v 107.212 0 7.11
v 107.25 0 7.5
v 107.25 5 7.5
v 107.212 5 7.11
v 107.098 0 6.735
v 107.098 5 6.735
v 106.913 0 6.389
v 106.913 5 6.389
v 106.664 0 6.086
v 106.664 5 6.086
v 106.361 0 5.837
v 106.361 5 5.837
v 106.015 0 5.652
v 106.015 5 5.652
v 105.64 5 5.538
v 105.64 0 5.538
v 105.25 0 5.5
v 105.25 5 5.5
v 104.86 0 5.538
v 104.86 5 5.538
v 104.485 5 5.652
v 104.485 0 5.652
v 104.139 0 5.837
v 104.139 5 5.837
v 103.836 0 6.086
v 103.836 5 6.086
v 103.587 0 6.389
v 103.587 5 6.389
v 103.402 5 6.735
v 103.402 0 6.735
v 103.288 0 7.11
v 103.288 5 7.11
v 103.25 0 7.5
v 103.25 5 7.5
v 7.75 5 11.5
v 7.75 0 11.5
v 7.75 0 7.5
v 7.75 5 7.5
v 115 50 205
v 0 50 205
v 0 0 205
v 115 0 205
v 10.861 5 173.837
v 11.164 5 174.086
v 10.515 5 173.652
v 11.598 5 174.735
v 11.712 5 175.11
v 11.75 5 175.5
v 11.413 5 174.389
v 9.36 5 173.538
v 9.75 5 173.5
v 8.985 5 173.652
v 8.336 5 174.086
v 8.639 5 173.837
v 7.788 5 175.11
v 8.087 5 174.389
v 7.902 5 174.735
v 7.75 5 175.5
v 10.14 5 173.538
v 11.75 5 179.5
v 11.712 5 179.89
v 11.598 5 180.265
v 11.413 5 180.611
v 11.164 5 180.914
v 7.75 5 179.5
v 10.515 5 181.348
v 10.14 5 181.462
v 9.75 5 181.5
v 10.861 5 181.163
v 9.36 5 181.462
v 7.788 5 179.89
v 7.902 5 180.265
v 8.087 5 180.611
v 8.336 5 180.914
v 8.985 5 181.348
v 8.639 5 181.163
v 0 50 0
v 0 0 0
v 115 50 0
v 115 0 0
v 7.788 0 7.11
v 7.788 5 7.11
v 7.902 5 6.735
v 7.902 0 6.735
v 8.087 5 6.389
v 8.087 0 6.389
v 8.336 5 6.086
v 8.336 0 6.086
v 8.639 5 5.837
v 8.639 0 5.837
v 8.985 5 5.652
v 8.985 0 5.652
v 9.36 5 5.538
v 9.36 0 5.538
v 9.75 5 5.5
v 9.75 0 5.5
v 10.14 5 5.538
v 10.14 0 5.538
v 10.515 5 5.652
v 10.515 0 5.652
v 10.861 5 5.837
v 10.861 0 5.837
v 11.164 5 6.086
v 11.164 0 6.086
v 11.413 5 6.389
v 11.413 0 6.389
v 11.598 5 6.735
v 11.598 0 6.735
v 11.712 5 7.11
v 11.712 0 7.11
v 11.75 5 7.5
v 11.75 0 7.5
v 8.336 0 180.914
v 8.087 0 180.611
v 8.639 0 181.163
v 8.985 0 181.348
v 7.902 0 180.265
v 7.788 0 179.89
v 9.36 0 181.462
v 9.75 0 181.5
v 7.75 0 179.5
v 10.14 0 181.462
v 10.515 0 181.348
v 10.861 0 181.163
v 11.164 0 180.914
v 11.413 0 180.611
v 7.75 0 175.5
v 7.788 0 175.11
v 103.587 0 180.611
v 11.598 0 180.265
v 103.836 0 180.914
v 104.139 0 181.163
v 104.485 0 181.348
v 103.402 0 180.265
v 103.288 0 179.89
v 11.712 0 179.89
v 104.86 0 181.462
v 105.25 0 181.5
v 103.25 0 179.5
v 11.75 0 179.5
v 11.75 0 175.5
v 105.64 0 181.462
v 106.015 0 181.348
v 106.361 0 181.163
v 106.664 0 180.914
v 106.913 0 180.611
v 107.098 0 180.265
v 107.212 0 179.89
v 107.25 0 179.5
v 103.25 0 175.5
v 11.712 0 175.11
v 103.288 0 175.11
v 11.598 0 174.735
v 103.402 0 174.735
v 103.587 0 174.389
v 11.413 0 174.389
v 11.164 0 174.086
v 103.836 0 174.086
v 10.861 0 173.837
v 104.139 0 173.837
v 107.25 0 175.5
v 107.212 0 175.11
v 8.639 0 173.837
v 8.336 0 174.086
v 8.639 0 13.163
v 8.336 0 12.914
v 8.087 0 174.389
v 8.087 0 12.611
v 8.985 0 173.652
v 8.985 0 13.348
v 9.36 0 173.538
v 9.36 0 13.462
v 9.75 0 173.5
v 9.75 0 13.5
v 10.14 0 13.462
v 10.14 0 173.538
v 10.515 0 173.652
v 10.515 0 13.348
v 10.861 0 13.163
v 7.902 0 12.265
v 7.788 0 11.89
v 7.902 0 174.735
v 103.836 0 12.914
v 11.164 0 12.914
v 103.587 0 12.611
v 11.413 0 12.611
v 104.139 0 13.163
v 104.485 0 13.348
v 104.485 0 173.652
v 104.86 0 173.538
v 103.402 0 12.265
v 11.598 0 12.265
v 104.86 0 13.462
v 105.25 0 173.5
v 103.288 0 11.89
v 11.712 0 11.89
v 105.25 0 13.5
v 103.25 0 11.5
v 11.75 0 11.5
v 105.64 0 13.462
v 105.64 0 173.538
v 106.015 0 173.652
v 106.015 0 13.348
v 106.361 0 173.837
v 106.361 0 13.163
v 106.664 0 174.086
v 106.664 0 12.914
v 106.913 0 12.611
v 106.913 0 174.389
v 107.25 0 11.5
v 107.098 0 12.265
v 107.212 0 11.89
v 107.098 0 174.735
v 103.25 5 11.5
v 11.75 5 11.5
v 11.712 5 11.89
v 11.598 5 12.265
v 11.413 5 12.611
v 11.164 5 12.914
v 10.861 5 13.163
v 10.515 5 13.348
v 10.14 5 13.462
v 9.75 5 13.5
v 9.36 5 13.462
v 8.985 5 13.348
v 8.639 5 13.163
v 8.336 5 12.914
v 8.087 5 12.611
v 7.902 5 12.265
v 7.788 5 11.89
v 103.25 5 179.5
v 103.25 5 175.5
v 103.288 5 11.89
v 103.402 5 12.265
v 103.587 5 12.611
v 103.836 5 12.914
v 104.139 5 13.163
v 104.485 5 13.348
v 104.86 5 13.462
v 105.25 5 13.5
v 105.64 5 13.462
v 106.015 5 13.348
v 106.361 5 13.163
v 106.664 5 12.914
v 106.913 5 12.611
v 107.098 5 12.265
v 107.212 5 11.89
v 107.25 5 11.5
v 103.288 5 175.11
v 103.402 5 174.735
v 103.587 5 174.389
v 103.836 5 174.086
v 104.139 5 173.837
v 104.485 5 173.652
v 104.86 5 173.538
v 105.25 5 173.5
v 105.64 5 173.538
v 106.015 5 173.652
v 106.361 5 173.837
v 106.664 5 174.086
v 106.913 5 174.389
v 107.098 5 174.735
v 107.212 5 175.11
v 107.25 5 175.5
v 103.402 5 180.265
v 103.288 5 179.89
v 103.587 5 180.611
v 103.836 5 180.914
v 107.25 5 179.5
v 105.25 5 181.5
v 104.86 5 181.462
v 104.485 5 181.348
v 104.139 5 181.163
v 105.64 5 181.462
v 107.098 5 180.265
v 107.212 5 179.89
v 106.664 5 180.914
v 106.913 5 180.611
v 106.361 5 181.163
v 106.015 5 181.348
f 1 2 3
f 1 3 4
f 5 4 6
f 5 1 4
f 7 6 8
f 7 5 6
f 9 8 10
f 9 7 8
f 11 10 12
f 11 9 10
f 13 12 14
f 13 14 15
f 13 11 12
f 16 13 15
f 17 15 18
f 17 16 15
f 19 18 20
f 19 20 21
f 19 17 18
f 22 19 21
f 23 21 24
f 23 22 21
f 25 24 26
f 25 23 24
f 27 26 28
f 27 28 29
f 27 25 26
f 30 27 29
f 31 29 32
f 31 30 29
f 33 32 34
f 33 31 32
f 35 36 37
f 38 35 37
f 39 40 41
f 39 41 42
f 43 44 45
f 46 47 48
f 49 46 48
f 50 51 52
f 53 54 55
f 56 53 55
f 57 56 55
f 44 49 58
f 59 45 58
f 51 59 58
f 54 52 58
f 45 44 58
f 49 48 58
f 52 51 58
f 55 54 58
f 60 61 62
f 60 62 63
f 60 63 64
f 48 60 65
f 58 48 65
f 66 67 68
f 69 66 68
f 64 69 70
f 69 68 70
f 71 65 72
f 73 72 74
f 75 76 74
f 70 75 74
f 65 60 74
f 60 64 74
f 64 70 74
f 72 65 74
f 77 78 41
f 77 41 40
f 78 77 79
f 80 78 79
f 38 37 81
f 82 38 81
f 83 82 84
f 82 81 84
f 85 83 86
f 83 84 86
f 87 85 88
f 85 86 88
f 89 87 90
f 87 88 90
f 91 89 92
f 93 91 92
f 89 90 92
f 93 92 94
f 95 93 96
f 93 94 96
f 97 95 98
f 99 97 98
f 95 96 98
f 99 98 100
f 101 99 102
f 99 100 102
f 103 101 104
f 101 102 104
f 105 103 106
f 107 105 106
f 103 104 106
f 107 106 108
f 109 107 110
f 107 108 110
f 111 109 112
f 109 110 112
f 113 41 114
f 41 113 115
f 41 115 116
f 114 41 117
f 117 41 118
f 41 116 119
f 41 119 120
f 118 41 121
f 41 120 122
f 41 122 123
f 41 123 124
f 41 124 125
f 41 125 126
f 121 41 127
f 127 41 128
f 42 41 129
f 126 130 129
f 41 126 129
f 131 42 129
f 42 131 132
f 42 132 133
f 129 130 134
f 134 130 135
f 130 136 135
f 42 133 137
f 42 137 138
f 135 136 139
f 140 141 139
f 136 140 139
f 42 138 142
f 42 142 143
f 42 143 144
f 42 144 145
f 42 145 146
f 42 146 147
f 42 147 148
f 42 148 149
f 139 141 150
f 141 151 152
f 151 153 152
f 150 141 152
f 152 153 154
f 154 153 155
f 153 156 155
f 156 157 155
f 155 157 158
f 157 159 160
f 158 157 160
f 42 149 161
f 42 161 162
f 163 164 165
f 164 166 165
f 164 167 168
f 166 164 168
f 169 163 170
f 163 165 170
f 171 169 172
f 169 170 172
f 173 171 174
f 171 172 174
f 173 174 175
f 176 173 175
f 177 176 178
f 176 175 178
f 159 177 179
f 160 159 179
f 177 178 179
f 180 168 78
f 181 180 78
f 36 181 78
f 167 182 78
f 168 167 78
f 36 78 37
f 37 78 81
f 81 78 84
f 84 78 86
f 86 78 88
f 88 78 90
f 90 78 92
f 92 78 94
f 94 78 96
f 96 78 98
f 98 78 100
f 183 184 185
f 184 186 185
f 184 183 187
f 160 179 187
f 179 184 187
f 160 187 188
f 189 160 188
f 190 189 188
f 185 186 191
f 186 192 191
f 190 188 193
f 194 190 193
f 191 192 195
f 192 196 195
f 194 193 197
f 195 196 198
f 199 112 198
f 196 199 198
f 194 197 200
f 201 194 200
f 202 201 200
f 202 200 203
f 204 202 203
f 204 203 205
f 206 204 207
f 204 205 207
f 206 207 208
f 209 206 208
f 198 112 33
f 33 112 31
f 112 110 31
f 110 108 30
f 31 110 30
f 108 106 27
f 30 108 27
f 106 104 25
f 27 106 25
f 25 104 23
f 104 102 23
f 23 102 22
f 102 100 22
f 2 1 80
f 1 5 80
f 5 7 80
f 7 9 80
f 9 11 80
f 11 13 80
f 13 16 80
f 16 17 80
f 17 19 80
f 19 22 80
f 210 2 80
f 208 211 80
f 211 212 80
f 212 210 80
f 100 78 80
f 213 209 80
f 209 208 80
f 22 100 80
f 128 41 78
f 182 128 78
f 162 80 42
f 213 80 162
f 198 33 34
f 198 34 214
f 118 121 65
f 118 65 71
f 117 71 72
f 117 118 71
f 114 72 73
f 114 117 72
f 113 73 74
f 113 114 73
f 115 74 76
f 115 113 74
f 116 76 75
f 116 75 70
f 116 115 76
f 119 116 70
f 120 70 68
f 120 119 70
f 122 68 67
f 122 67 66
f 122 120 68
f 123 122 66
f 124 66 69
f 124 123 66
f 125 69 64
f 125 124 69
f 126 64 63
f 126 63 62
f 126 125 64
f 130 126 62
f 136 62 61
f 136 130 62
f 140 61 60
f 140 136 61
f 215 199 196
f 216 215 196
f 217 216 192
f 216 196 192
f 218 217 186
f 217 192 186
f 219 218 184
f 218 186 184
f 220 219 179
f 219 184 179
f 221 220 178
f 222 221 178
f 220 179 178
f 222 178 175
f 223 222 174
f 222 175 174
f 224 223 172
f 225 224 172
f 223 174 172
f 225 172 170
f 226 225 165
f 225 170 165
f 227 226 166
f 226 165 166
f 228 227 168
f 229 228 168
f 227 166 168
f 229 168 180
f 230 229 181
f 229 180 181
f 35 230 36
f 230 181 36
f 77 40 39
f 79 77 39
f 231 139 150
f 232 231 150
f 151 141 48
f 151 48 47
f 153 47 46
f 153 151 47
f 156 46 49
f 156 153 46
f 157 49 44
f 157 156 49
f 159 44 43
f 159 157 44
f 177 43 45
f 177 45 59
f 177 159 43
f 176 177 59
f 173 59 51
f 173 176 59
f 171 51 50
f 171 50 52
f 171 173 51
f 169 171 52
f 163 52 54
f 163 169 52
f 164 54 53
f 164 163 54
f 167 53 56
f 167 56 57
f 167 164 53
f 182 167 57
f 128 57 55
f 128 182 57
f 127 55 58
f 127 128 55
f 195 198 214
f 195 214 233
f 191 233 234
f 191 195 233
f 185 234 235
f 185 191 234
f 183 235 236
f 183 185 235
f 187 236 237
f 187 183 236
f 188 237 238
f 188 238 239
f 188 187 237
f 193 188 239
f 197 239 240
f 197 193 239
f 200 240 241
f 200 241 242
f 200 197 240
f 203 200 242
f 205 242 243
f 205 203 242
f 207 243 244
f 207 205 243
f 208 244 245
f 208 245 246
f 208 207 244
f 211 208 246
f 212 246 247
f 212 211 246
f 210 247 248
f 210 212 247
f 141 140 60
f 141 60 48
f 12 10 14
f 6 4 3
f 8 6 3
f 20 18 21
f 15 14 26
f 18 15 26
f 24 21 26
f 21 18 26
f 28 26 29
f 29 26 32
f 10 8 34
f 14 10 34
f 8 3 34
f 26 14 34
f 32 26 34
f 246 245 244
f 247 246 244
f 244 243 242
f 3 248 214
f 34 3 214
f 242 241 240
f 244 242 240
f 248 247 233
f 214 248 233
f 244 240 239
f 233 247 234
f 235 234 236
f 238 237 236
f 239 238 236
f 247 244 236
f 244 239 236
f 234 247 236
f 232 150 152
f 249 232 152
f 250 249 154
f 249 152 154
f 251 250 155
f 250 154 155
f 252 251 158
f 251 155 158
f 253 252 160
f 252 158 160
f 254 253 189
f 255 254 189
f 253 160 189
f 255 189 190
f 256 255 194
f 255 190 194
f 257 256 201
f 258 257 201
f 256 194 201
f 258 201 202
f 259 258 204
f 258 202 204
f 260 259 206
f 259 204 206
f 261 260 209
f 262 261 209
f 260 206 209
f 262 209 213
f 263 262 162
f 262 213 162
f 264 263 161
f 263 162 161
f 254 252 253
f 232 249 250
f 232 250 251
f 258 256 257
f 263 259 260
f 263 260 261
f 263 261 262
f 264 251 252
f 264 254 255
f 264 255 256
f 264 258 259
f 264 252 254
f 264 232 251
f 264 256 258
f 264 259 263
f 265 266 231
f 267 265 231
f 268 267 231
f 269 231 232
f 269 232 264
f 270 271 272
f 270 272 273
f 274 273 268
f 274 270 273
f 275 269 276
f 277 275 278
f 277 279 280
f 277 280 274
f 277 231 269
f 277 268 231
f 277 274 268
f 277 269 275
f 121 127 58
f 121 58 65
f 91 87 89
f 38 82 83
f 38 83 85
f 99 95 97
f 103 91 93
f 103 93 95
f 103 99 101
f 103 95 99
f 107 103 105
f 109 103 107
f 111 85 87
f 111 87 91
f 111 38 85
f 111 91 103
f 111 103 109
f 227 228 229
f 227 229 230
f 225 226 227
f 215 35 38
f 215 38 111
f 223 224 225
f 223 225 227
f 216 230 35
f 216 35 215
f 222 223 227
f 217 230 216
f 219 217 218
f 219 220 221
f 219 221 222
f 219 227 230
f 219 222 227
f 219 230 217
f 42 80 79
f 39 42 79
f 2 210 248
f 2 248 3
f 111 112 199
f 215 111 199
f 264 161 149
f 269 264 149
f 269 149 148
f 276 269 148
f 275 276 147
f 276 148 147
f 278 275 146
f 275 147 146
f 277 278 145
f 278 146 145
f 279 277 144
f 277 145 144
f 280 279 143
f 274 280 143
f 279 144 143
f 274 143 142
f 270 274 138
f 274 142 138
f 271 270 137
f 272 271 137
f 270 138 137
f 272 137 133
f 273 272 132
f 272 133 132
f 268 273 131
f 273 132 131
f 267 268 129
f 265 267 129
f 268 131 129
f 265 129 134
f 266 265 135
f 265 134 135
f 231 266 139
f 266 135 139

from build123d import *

# Parameters (mm, degrees)
SKETCH1_W           = 115
SKETCH1_H           = 50
BOSS_EXTRUDE1_DEPTH = 205
CUT_EXTRUDE1_DEPTH  = 5


with BuildPart() as part:
    # Sketch1 → Boss-Extrude1 (new body)
    with BuildSketch(Plane.XY):
        with Locations((57.5, 25)):
            Rectangle(SKETCH1_W, SKETCH1_H)
    extrude(amount=BOSS_EXTRUDE1_DEPTH)

    # Sketch2 → Cut-Extrude1 (cut)
    with BuildSketch(Plane.XZ):
        with BuildLine():
            Line((11.75, 179.5), (11.75, 175.5))
            ThreePointArc((11.75, 175.5), (9.75, 173.5), (7.75, 175.5))
            Line((7.75, 175.5), (7.75, 179.5))
            ThreePointArc((7.75, 179.5), (9.75, 181.5), (11.75, 179.5))
        make_face()
        with BuildLine():
            Line((103.25, 179.5), (103.25, 175.5))
            ThreePointArc((103.25, 175.5), (105.25, 173.5), (107.25, 175.5))
            Line((107.25, 175.5), (107.25, 179.5))
            ThreePointArc((107.25, 179.5), (105.25, 181.5), (103.25, 179.5))
        make_face()
        with BuildLine():
            Line((11.75, 7.5), (11.75, 11.5))
            ThreePointArc((11.75, 11.5), (9.75, 13.5), (7.75, 11.5))
            Line((7.75, 11.5), (7.75, 7.5))
            ThreePointArc((7.75, 7.5), (9.75, 5.5), (11.75, 7.5))
        make_face()
        with BuildLine():
            Line((103.25, 7.5), (103.25, 11.5))
            ThreePointArc((103.25, 11.5), (105.25, 13.5), (107.25, 11.5))
            Line((107.25, 11.5), (107.25, 7.5))
            ThreePointArc((107.25, 7.5), (105.25, 5.5), (103.25, 7.5))
        make_face()
    extrude(amount=-CUT_EXTRUDE1_DEPTH, mode=Mode.SUBTRACT)


solid = part.part
